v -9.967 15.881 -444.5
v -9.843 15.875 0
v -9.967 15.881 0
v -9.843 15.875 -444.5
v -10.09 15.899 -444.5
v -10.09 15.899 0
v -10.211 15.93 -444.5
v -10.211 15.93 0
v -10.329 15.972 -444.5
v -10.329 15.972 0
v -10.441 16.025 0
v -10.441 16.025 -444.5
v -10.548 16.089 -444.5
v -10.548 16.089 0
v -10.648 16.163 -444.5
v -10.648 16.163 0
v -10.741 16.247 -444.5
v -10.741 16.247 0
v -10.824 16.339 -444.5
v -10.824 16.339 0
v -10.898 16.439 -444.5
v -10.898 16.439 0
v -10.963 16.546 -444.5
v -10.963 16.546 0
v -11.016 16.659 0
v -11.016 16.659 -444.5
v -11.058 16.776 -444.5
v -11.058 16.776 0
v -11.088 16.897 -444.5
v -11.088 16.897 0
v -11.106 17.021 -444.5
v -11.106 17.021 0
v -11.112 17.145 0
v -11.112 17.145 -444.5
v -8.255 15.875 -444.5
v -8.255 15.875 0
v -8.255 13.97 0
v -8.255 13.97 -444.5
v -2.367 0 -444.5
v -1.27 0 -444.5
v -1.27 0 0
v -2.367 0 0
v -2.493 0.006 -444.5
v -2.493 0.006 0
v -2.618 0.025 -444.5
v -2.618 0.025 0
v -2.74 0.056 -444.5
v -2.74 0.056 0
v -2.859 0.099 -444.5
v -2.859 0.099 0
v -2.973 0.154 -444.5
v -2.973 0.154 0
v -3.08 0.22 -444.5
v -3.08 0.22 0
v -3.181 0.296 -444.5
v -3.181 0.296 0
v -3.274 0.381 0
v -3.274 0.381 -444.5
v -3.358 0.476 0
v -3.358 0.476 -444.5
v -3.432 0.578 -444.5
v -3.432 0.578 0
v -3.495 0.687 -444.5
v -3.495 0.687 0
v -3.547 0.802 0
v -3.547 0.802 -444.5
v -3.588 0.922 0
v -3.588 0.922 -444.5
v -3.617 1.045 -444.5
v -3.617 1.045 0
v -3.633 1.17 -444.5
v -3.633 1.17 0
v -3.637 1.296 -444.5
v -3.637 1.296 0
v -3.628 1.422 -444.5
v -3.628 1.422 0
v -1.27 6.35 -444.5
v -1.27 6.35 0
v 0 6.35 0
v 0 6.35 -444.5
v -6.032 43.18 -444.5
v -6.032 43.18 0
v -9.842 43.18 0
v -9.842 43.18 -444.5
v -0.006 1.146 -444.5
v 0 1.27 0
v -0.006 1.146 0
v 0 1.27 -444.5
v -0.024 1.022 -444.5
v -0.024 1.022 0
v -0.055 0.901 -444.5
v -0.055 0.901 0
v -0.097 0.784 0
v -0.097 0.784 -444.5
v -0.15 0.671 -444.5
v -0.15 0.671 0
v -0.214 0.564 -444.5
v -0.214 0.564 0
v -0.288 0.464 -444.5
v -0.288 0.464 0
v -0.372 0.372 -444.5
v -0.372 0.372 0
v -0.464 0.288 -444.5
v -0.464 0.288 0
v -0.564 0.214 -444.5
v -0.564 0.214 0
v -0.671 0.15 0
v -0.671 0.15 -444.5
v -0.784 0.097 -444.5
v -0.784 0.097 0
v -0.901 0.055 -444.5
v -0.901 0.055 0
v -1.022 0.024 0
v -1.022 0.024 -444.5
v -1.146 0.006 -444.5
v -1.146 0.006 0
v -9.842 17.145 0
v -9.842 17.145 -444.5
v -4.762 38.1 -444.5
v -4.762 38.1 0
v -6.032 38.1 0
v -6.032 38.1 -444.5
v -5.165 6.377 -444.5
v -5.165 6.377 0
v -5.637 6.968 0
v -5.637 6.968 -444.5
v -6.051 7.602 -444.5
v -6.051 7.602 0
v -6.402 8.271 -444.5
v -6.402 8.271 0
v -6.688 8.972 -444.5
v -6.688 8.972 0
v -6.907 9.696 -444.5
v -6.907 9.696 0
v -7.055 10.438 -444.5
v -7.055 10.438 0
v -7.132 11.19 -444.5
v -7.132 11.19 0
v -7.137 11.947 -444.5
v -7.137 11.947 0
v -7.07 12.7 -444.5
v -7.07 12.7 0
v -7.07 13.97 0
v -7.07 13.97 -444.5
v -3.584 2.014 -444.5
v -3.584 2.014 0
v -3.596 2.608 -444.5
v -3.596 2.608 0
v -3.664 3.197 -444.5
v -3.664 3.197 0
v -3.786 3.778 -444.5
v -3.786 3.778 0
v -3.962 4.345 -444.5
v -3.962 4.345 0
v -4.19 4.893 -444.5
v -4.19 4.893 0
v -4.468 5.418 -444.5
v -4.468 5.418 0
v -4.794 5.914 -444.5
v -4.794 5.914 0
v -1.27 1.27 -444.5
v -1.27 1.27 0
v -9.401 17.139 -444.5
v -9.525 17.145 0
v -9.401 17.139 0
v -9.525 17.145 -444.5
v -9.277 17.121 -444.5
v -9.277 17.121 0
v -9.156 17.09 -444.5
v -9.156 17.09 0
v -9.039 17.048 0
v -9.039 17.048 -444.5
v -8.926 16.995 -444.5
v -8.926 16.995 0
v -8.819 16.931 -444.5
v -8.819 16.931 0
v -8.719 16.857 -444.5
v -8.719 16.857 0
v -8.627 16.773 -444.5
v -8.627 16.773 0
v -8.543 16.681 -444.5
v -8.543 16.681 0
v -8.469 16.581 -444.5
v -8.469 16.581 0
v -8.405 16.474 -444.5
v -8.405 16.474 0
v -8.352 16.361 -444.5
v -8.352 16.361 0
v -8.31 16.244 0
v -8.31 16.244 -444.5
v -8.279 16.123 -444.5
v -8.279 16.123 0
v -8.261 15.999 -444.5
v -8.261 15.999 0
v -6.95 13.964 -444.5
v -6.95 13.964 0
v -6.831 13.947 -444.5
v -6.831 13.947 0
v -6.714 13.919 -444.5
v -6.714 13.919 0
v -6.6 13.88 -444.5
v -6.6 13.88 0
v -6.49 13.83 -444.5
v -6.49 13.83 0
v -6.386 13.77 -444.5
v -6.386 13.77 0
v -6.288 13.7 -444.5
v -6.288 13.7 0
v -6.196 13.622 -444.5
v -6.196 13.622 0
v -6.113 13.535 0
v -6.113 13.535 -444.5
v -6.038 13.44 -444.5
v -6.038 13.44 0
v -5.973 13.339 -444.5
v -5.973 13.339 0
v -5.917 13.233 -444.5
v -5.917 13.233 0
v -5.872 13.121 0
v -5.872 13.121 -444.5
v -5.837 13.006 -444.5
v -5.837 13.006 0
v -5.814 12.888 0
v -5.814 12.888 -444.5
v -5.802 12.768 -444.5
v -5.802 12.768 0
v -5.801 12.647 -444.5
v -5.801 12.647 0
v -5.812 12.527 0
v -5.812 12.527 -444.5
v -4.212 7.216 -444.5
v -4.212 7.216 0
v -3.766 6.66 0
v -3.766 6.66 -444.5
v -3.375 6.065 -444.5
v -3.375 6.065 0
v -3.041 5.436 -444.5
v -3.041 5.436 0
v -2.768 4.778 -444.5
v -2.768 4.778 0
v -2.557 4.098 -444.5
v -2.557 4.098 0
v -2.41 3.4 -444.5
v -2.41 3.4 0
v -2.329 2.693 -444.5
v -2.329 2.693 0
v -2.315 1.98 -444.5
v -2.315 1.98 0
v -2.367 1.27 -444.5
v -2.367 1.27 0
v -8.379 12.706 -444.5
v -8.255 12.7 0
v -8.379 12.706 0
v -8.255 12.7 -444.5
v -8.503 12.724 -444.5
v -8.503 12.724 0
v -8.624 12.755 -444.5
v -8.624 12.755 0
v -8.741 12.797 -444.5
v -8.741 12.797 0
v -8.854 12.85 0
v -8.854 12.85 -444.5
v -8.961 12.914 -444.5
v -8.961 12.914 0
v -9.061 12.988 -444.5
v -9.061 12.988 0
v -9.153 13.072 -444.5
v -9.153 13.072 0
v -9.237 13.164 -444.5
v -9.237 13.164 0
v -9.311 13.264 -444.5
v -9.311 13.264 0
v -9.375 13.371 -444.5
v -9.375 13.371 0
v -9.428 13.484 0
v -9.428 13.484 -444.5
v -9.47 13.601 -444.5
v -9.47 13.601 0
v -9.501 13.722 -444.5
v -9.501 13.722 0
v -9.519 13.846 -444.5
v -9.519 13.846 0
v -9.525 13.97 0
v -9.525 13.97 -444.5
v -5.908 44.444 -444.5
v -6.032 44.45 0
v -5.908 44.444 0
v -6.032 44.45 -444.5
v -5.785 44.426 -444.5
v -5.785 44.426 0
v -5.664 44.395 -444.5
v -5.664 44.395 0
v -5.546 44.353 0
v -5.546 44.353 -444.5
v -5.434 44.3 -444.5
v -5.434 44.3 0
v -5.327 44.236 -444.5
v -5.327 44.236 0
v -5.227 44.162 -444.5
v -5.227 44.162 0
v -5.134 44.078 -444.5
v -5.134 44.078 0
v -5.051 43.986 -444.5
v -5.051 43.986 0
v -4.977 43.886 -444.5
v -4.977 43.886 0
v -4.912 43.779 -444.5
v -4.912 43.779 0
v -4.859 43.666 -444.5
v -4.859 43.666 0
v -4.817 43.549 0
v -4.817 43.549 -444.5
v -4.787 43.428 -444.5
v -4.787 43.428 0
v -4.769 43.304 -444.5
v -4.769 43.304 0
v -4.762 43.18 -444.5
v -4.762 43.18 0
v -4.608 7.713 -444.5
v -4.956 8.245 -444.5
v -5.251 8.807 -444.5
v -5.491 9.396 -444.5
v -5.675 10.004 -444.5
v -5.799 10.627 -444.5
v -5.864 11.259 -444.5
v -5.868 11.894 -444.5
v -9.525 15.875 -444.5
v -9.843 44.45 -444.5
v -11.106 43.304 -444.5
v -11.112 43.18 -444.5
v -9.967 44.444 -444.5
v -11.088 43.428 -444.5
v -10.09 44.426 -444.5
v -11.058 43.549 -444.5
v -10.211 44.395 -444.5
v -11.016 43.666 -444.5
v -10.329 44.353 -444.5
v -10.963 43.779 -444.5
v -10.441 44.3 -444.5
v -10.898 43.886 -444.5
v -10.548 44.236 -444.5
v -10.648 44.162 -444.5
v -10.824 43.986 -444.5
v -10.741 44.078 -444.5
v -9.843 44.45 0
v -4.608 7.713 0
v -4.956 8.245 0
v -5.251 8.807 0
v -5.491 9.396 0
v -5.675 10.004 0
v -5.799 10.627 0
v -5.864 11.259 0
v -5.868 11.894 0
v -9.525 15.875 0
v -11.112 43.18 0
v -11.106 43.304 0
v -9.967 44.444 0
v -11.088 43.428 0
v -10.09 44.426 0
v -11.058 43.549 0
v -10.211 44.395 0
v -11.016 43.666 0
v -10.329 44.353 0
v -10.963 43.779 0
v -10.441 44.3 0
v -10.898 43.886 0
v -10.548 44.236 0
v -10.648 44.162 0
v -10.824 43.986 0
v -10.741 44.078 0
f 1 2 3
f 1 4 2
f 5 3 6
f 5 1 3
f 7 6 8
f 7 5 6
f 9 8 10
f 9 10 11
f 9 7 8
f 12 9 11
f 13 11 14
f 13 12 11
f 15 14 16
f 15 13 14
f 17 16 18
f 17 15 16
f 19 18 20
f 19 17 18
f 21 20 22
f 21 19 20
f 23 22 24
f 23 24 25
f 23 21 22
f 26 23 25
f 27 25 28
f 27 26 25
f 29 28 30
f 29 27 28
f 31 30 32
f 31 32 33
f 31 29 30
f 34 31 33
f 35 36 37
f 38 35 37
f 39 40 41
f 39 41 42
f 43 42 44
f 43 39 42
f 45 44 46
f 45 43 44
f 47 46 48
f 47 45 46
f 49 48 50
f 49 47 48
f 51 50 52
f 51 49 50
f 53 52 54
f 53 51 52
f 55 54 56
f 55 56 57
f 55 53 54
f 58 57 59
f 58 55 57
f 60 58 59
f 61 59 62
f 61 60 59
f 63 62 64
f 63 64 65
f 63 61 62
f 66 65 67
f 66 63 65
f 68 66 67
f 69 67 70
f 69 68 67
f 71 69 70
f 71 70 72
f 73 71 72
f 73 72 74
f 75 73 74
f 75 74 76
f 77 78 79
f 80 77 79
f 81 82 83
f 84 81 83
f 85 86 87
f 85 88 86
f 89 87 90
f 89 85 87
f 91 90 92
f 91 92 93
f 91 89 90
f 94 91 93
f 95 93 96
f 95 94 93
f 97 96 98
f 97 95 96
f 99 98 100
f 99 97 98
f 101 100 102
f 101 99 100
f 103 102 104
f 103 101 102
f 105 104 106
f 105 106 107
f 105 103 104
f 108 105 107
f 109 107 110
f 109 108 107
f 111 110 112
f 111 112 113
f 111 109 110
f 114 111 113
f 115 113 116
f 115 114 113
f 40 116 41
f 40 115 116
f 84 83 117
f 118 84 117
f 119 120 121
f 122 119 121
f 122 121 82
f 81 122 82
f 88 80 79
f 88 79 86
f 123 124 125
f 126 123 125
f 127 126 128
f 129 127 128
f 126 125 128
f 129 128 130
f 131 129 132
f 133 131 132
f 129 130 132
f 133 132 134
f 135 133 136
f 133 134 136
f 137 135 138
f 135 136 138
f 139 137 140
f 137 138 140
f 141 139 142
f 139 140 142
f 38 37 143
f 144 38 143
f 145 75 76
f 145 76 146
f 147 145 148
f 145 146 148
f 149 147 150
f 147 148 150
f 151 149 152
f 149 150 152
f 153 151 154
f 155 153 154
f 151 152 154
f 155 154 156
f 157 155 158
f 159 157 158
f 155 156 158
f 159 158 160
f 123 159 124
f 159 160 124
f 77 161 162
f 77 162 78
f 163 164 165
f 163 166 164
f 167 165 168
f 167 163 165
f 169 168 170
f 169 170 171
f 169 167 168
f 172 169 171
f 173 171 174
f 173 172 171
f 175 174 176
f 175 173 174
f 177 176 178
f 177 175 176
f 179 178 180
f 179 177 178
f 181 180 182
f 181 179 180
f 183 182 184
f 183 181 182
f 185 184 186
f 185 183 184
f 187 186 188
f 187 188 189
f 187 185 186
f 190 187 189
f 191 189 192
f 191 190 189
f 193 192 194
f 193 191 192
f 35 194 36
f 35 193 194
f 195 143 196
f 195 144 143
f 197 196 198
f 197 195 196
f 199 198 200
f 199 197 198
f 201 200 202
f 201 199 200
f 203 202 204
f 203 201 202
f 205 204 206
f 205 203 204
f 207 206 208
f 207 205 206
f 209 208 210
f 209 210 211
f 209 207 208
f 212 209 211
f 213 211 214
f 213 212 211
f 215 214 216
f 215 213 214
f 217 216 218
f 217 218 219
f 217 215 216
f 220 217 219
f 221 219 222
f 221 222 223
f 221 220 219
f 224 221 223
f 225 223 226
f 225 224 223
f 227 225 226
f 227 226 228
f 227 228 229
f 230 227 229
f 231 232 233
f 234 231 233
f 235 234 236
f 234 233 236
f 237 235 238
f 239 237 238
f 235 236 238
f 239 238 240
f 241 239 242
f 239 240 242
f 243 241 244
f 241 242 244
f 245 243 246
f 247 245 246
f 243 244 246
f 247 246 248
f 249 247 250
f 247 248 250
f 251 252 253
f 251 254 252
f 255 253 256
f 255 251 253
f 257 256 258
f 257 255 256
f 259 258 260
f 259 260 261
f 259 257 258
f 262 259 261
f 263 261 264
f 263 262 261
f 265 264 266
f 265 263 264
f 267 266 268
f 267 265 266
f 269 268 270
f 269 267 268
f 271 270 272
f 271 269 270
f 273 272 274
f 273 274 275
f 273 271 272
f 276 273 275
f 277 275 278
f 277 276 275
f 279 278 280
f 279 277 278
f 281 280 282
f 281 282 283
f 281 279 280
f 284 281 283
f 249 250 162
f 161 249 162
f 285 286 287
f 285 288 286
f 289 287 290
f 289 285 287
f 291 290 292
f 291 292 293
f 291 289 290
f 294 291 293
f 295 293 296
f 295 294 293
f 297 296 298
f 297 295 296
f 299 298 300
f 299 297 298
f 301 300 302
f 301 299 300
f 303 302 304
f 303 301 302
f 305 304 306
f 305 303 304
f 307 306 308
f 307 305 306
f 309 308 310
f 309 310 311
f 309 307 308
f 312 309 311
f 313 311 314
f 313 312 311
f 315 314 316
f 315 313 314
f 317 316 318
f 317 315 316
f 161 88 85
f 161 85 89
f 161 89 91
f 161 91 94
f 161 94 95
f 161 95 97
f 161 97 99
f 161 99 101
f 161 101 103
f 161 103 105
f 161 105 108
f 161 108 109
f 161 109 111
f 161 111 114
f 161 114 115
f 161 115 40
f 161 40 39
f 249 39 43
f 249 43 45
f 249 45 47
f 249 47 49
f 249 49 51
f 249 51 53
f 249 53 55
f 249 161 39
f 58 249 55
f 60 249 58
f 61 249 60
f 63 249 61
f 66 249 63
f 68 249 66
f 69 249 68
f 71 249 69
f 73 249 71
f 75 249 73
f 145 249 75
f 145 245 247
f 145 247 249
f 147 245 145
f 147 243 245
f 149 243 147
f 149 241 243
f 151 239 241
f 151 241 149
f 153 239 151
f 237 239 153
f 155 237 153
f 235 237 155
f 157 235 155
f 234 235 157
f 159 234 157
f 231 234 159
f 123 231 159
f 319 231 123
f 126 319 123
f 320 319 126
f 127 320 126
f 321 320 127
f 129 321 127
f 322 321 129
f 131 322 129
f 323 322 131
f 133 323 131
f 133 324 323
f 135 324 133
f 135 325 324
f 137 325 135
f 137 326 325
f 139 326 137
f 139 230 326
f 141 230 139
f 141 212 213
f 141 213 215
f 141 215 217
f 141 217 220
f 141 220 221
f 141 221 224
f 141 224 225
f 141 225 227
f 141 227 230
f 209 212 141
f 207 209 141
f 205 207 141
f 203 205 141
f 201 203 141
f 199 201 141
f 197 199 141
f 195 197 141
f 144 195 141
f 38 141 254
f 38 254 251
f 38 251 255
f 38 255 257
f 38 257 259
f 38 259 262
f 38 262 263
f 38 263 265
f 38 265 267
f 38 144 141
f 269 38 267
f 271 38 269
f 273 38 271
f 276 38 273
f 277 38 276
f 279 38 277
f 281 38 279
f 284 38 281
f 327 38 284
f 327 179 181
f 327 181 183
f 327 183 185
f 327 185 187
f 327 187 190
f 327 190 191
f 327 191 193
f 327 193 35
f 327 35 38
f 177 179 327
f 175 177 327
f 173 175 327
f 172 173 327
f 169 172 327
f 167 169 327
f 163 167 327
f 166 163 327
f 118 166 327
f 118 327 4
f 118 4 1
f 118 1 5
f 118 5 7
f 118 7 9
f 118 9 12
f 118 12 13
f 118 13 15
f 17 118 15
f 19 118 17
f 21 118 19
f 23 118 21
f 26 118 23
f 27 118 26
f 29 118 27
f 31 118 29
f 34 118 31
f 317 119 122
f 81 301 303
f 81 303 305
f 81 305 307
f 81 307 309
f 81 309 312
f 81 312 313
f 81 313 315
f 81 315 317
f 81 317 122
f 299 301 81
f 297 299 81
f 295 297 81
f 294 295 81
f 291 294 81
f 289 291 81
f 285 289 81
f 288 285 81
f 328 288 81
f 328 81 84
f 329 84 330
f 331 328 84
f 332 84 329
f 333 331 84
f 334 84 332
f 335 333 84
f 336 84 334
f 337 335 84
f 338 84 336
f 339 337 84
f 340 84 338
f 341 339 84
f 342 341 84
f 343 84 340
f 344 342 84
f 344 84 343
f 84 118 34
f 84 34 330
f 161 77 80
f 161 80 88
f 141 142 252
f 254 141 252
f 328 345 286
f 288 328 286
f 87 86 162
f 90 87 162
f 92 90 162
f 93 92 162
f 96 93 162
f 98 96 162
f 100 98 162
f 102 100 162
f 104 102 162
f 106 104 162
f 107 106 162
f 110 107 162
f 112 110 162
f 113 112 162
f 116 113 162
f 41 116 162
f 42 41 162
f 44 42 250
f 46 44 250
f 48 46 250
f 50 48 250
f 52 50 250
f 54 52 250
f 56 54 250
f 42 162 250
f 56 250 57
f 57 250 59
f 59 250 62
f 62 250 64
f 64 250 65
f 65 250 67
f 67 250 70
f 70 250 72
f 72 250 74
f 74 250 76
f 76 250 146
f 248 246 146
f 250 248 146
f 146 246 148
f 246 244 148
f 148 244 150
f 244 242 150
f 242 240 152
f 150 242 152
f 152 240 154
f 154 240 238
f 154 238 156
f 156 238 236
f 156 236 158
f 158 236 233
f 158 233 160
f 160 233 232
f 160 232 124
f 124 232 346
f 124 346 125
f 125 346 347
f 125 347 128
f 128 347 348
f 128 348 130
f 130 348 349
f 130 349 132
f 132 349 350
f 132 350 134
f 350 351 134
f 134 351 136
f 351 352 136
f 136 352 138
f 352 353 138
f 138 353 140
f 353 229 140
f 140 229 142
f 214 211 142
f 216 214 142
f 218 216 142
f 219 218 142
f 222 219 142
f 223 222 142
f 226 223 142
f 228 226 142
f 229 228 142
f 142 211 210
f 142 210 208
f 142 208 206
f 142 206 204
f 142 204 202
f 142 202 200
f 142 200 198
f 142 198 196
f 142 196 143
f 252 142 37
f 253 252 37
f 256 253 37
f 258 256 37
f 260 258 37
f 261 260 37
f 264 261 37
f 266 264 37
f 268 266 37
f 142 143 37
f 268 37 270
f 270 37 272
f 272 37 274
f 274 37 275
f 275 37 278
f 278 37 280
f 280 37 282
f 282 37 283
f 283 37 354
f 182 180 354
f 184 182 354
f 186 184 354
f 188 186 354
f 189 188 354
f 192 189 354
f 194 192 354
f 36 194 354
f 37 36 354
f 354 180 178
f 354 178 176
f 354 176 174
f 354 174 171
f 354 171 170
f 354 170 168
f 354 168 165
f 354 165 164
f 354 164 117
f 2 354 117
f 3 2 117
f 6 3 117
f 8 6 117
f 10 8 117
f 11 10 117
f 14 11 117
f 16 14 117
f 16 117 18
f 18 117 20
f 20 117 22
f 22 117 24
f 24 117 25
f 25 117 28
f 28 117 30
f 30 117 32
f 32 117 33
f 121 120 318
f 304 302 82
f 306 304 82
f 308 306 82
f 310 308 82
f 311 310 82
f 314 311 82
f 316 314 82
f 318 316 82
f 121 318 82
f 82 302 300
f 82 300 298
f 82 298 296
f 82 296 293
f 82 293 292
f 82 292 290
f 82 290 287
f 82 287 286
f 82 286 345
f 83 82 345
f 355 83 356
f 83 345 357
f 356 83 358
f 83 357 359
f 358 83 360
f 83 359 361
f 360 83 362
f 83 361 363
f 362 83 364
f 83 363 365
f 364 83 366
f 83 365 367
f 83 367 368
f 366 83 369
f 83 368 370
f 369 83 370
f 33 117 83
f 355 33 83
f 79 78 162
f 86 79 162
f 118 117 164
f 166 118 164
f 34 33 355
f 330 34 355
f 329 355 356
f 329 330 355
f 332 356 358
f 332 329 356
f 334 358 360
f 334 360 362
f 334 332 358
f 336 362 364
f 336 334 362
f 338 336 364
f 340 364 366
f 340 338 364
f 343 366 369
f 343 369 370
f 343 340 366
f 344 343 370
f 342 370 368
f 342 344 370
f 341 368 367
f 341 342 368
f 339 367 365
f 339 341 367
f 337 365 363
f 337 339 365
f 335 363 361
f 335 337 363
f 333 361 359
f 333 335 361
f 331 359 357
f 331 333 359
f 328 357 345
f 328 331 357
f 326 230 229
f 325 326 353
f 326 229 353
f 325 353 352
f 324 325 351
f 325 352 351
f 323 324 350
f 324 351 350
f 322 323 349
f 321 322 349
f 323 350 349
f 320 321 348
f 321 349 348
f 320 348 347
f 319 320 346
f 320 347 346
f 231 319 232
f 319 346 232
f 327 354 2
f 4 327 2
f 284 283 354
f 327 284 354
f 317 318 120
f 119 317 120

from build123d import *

# Parameters (mm, degrees)
EXTRUDE_THIN1_DEPTH = 444.5
FILLET1_R           = 1.27


with BuildPart() as part:
    # Sketch1 → Extrude-Thin1 (new body)
    with BuildSketch(Plane.XY):
        with BuildLine():
            Line((0, 6.35), (0, 0))
            Line((0, 0), (-3.96875, 0))
            ThreePointArc((-3.96875, 0), (-3.690796903, 3.353029057), (-5.164974256, 6.37740716))
            ThreePointArc((-5.164974256, 6.37740716), (-6.806228989, 9.331186698), (-7.070099394, 12.7))
            Line((-7.070099394, 12.7), (-9.525, 12.7))
            Line((-9.525, 12.7), (-9.525, 15.875))
            Line((-9.525, 15.875), (-11.1125, 15.875))
            Line((-11.1125, 15.875), (-11.1125, 44.45))
            Line((-11.1125, 44.45), (-4.7625, 44.45))
            Line((-4.7625, 44.45), (-4.7625, 38.1))
            Line((-4.7625, 38.1), (-6.0325, 38.1))
            Line((-6.0325, 38.1), (-6.0325, 43.18))
            Line((-6.0325, 43.18), (-9.8425, 43.18))
            Line((-9.8425, 43.18), (-9.8425, 17.145))
            Line((-9.8425, 17.145), (-8.255, 17.145))
            Line((-8.255, 17.145), (-8.255, 13.97))
            Line((-8.255, 13.97), (-5.446343041, 13.97))
            ThreePointArc((-5.446343041, 13.97), (-5.765030298, 10.42206557), (-4.211578375, 7.216416274))
            ThreePointArc((-4.211578375, 7.216416274), (-2.654146129, 4.440218432), (-2.366770495, 1.27))
            Line((-2.366770495, 1.27), (-1.27, 1.27))
            Line((-1.27, 1.27), (-1.27, 6.35))
            Line((-1.27, 6.35), (0, 6.35))
        make_face()
    extrude(amount=-EXTRUDE_THIN1_DEPTH)

    # Fillet1
    fillet1_edges = [part.edges().sort_by_distance(p)[0] for p in [
        (-8.255, 17.145, -222.25),
        (-5.446343041, 13.97, -222.25),
        (0, 0, -222.25),
        (-3.96875, 0, -222.25),
        (-9.525, 12.7, -222.25),
        (-11.1125, 15.875, -222.25),
        (-11.1125, 44.45, -222.25),
        (-4.7625, 44.45, -222.25),
    ]]
    fillet(fillet1_edges, radius=FILLET1_R)


solid = part.part
